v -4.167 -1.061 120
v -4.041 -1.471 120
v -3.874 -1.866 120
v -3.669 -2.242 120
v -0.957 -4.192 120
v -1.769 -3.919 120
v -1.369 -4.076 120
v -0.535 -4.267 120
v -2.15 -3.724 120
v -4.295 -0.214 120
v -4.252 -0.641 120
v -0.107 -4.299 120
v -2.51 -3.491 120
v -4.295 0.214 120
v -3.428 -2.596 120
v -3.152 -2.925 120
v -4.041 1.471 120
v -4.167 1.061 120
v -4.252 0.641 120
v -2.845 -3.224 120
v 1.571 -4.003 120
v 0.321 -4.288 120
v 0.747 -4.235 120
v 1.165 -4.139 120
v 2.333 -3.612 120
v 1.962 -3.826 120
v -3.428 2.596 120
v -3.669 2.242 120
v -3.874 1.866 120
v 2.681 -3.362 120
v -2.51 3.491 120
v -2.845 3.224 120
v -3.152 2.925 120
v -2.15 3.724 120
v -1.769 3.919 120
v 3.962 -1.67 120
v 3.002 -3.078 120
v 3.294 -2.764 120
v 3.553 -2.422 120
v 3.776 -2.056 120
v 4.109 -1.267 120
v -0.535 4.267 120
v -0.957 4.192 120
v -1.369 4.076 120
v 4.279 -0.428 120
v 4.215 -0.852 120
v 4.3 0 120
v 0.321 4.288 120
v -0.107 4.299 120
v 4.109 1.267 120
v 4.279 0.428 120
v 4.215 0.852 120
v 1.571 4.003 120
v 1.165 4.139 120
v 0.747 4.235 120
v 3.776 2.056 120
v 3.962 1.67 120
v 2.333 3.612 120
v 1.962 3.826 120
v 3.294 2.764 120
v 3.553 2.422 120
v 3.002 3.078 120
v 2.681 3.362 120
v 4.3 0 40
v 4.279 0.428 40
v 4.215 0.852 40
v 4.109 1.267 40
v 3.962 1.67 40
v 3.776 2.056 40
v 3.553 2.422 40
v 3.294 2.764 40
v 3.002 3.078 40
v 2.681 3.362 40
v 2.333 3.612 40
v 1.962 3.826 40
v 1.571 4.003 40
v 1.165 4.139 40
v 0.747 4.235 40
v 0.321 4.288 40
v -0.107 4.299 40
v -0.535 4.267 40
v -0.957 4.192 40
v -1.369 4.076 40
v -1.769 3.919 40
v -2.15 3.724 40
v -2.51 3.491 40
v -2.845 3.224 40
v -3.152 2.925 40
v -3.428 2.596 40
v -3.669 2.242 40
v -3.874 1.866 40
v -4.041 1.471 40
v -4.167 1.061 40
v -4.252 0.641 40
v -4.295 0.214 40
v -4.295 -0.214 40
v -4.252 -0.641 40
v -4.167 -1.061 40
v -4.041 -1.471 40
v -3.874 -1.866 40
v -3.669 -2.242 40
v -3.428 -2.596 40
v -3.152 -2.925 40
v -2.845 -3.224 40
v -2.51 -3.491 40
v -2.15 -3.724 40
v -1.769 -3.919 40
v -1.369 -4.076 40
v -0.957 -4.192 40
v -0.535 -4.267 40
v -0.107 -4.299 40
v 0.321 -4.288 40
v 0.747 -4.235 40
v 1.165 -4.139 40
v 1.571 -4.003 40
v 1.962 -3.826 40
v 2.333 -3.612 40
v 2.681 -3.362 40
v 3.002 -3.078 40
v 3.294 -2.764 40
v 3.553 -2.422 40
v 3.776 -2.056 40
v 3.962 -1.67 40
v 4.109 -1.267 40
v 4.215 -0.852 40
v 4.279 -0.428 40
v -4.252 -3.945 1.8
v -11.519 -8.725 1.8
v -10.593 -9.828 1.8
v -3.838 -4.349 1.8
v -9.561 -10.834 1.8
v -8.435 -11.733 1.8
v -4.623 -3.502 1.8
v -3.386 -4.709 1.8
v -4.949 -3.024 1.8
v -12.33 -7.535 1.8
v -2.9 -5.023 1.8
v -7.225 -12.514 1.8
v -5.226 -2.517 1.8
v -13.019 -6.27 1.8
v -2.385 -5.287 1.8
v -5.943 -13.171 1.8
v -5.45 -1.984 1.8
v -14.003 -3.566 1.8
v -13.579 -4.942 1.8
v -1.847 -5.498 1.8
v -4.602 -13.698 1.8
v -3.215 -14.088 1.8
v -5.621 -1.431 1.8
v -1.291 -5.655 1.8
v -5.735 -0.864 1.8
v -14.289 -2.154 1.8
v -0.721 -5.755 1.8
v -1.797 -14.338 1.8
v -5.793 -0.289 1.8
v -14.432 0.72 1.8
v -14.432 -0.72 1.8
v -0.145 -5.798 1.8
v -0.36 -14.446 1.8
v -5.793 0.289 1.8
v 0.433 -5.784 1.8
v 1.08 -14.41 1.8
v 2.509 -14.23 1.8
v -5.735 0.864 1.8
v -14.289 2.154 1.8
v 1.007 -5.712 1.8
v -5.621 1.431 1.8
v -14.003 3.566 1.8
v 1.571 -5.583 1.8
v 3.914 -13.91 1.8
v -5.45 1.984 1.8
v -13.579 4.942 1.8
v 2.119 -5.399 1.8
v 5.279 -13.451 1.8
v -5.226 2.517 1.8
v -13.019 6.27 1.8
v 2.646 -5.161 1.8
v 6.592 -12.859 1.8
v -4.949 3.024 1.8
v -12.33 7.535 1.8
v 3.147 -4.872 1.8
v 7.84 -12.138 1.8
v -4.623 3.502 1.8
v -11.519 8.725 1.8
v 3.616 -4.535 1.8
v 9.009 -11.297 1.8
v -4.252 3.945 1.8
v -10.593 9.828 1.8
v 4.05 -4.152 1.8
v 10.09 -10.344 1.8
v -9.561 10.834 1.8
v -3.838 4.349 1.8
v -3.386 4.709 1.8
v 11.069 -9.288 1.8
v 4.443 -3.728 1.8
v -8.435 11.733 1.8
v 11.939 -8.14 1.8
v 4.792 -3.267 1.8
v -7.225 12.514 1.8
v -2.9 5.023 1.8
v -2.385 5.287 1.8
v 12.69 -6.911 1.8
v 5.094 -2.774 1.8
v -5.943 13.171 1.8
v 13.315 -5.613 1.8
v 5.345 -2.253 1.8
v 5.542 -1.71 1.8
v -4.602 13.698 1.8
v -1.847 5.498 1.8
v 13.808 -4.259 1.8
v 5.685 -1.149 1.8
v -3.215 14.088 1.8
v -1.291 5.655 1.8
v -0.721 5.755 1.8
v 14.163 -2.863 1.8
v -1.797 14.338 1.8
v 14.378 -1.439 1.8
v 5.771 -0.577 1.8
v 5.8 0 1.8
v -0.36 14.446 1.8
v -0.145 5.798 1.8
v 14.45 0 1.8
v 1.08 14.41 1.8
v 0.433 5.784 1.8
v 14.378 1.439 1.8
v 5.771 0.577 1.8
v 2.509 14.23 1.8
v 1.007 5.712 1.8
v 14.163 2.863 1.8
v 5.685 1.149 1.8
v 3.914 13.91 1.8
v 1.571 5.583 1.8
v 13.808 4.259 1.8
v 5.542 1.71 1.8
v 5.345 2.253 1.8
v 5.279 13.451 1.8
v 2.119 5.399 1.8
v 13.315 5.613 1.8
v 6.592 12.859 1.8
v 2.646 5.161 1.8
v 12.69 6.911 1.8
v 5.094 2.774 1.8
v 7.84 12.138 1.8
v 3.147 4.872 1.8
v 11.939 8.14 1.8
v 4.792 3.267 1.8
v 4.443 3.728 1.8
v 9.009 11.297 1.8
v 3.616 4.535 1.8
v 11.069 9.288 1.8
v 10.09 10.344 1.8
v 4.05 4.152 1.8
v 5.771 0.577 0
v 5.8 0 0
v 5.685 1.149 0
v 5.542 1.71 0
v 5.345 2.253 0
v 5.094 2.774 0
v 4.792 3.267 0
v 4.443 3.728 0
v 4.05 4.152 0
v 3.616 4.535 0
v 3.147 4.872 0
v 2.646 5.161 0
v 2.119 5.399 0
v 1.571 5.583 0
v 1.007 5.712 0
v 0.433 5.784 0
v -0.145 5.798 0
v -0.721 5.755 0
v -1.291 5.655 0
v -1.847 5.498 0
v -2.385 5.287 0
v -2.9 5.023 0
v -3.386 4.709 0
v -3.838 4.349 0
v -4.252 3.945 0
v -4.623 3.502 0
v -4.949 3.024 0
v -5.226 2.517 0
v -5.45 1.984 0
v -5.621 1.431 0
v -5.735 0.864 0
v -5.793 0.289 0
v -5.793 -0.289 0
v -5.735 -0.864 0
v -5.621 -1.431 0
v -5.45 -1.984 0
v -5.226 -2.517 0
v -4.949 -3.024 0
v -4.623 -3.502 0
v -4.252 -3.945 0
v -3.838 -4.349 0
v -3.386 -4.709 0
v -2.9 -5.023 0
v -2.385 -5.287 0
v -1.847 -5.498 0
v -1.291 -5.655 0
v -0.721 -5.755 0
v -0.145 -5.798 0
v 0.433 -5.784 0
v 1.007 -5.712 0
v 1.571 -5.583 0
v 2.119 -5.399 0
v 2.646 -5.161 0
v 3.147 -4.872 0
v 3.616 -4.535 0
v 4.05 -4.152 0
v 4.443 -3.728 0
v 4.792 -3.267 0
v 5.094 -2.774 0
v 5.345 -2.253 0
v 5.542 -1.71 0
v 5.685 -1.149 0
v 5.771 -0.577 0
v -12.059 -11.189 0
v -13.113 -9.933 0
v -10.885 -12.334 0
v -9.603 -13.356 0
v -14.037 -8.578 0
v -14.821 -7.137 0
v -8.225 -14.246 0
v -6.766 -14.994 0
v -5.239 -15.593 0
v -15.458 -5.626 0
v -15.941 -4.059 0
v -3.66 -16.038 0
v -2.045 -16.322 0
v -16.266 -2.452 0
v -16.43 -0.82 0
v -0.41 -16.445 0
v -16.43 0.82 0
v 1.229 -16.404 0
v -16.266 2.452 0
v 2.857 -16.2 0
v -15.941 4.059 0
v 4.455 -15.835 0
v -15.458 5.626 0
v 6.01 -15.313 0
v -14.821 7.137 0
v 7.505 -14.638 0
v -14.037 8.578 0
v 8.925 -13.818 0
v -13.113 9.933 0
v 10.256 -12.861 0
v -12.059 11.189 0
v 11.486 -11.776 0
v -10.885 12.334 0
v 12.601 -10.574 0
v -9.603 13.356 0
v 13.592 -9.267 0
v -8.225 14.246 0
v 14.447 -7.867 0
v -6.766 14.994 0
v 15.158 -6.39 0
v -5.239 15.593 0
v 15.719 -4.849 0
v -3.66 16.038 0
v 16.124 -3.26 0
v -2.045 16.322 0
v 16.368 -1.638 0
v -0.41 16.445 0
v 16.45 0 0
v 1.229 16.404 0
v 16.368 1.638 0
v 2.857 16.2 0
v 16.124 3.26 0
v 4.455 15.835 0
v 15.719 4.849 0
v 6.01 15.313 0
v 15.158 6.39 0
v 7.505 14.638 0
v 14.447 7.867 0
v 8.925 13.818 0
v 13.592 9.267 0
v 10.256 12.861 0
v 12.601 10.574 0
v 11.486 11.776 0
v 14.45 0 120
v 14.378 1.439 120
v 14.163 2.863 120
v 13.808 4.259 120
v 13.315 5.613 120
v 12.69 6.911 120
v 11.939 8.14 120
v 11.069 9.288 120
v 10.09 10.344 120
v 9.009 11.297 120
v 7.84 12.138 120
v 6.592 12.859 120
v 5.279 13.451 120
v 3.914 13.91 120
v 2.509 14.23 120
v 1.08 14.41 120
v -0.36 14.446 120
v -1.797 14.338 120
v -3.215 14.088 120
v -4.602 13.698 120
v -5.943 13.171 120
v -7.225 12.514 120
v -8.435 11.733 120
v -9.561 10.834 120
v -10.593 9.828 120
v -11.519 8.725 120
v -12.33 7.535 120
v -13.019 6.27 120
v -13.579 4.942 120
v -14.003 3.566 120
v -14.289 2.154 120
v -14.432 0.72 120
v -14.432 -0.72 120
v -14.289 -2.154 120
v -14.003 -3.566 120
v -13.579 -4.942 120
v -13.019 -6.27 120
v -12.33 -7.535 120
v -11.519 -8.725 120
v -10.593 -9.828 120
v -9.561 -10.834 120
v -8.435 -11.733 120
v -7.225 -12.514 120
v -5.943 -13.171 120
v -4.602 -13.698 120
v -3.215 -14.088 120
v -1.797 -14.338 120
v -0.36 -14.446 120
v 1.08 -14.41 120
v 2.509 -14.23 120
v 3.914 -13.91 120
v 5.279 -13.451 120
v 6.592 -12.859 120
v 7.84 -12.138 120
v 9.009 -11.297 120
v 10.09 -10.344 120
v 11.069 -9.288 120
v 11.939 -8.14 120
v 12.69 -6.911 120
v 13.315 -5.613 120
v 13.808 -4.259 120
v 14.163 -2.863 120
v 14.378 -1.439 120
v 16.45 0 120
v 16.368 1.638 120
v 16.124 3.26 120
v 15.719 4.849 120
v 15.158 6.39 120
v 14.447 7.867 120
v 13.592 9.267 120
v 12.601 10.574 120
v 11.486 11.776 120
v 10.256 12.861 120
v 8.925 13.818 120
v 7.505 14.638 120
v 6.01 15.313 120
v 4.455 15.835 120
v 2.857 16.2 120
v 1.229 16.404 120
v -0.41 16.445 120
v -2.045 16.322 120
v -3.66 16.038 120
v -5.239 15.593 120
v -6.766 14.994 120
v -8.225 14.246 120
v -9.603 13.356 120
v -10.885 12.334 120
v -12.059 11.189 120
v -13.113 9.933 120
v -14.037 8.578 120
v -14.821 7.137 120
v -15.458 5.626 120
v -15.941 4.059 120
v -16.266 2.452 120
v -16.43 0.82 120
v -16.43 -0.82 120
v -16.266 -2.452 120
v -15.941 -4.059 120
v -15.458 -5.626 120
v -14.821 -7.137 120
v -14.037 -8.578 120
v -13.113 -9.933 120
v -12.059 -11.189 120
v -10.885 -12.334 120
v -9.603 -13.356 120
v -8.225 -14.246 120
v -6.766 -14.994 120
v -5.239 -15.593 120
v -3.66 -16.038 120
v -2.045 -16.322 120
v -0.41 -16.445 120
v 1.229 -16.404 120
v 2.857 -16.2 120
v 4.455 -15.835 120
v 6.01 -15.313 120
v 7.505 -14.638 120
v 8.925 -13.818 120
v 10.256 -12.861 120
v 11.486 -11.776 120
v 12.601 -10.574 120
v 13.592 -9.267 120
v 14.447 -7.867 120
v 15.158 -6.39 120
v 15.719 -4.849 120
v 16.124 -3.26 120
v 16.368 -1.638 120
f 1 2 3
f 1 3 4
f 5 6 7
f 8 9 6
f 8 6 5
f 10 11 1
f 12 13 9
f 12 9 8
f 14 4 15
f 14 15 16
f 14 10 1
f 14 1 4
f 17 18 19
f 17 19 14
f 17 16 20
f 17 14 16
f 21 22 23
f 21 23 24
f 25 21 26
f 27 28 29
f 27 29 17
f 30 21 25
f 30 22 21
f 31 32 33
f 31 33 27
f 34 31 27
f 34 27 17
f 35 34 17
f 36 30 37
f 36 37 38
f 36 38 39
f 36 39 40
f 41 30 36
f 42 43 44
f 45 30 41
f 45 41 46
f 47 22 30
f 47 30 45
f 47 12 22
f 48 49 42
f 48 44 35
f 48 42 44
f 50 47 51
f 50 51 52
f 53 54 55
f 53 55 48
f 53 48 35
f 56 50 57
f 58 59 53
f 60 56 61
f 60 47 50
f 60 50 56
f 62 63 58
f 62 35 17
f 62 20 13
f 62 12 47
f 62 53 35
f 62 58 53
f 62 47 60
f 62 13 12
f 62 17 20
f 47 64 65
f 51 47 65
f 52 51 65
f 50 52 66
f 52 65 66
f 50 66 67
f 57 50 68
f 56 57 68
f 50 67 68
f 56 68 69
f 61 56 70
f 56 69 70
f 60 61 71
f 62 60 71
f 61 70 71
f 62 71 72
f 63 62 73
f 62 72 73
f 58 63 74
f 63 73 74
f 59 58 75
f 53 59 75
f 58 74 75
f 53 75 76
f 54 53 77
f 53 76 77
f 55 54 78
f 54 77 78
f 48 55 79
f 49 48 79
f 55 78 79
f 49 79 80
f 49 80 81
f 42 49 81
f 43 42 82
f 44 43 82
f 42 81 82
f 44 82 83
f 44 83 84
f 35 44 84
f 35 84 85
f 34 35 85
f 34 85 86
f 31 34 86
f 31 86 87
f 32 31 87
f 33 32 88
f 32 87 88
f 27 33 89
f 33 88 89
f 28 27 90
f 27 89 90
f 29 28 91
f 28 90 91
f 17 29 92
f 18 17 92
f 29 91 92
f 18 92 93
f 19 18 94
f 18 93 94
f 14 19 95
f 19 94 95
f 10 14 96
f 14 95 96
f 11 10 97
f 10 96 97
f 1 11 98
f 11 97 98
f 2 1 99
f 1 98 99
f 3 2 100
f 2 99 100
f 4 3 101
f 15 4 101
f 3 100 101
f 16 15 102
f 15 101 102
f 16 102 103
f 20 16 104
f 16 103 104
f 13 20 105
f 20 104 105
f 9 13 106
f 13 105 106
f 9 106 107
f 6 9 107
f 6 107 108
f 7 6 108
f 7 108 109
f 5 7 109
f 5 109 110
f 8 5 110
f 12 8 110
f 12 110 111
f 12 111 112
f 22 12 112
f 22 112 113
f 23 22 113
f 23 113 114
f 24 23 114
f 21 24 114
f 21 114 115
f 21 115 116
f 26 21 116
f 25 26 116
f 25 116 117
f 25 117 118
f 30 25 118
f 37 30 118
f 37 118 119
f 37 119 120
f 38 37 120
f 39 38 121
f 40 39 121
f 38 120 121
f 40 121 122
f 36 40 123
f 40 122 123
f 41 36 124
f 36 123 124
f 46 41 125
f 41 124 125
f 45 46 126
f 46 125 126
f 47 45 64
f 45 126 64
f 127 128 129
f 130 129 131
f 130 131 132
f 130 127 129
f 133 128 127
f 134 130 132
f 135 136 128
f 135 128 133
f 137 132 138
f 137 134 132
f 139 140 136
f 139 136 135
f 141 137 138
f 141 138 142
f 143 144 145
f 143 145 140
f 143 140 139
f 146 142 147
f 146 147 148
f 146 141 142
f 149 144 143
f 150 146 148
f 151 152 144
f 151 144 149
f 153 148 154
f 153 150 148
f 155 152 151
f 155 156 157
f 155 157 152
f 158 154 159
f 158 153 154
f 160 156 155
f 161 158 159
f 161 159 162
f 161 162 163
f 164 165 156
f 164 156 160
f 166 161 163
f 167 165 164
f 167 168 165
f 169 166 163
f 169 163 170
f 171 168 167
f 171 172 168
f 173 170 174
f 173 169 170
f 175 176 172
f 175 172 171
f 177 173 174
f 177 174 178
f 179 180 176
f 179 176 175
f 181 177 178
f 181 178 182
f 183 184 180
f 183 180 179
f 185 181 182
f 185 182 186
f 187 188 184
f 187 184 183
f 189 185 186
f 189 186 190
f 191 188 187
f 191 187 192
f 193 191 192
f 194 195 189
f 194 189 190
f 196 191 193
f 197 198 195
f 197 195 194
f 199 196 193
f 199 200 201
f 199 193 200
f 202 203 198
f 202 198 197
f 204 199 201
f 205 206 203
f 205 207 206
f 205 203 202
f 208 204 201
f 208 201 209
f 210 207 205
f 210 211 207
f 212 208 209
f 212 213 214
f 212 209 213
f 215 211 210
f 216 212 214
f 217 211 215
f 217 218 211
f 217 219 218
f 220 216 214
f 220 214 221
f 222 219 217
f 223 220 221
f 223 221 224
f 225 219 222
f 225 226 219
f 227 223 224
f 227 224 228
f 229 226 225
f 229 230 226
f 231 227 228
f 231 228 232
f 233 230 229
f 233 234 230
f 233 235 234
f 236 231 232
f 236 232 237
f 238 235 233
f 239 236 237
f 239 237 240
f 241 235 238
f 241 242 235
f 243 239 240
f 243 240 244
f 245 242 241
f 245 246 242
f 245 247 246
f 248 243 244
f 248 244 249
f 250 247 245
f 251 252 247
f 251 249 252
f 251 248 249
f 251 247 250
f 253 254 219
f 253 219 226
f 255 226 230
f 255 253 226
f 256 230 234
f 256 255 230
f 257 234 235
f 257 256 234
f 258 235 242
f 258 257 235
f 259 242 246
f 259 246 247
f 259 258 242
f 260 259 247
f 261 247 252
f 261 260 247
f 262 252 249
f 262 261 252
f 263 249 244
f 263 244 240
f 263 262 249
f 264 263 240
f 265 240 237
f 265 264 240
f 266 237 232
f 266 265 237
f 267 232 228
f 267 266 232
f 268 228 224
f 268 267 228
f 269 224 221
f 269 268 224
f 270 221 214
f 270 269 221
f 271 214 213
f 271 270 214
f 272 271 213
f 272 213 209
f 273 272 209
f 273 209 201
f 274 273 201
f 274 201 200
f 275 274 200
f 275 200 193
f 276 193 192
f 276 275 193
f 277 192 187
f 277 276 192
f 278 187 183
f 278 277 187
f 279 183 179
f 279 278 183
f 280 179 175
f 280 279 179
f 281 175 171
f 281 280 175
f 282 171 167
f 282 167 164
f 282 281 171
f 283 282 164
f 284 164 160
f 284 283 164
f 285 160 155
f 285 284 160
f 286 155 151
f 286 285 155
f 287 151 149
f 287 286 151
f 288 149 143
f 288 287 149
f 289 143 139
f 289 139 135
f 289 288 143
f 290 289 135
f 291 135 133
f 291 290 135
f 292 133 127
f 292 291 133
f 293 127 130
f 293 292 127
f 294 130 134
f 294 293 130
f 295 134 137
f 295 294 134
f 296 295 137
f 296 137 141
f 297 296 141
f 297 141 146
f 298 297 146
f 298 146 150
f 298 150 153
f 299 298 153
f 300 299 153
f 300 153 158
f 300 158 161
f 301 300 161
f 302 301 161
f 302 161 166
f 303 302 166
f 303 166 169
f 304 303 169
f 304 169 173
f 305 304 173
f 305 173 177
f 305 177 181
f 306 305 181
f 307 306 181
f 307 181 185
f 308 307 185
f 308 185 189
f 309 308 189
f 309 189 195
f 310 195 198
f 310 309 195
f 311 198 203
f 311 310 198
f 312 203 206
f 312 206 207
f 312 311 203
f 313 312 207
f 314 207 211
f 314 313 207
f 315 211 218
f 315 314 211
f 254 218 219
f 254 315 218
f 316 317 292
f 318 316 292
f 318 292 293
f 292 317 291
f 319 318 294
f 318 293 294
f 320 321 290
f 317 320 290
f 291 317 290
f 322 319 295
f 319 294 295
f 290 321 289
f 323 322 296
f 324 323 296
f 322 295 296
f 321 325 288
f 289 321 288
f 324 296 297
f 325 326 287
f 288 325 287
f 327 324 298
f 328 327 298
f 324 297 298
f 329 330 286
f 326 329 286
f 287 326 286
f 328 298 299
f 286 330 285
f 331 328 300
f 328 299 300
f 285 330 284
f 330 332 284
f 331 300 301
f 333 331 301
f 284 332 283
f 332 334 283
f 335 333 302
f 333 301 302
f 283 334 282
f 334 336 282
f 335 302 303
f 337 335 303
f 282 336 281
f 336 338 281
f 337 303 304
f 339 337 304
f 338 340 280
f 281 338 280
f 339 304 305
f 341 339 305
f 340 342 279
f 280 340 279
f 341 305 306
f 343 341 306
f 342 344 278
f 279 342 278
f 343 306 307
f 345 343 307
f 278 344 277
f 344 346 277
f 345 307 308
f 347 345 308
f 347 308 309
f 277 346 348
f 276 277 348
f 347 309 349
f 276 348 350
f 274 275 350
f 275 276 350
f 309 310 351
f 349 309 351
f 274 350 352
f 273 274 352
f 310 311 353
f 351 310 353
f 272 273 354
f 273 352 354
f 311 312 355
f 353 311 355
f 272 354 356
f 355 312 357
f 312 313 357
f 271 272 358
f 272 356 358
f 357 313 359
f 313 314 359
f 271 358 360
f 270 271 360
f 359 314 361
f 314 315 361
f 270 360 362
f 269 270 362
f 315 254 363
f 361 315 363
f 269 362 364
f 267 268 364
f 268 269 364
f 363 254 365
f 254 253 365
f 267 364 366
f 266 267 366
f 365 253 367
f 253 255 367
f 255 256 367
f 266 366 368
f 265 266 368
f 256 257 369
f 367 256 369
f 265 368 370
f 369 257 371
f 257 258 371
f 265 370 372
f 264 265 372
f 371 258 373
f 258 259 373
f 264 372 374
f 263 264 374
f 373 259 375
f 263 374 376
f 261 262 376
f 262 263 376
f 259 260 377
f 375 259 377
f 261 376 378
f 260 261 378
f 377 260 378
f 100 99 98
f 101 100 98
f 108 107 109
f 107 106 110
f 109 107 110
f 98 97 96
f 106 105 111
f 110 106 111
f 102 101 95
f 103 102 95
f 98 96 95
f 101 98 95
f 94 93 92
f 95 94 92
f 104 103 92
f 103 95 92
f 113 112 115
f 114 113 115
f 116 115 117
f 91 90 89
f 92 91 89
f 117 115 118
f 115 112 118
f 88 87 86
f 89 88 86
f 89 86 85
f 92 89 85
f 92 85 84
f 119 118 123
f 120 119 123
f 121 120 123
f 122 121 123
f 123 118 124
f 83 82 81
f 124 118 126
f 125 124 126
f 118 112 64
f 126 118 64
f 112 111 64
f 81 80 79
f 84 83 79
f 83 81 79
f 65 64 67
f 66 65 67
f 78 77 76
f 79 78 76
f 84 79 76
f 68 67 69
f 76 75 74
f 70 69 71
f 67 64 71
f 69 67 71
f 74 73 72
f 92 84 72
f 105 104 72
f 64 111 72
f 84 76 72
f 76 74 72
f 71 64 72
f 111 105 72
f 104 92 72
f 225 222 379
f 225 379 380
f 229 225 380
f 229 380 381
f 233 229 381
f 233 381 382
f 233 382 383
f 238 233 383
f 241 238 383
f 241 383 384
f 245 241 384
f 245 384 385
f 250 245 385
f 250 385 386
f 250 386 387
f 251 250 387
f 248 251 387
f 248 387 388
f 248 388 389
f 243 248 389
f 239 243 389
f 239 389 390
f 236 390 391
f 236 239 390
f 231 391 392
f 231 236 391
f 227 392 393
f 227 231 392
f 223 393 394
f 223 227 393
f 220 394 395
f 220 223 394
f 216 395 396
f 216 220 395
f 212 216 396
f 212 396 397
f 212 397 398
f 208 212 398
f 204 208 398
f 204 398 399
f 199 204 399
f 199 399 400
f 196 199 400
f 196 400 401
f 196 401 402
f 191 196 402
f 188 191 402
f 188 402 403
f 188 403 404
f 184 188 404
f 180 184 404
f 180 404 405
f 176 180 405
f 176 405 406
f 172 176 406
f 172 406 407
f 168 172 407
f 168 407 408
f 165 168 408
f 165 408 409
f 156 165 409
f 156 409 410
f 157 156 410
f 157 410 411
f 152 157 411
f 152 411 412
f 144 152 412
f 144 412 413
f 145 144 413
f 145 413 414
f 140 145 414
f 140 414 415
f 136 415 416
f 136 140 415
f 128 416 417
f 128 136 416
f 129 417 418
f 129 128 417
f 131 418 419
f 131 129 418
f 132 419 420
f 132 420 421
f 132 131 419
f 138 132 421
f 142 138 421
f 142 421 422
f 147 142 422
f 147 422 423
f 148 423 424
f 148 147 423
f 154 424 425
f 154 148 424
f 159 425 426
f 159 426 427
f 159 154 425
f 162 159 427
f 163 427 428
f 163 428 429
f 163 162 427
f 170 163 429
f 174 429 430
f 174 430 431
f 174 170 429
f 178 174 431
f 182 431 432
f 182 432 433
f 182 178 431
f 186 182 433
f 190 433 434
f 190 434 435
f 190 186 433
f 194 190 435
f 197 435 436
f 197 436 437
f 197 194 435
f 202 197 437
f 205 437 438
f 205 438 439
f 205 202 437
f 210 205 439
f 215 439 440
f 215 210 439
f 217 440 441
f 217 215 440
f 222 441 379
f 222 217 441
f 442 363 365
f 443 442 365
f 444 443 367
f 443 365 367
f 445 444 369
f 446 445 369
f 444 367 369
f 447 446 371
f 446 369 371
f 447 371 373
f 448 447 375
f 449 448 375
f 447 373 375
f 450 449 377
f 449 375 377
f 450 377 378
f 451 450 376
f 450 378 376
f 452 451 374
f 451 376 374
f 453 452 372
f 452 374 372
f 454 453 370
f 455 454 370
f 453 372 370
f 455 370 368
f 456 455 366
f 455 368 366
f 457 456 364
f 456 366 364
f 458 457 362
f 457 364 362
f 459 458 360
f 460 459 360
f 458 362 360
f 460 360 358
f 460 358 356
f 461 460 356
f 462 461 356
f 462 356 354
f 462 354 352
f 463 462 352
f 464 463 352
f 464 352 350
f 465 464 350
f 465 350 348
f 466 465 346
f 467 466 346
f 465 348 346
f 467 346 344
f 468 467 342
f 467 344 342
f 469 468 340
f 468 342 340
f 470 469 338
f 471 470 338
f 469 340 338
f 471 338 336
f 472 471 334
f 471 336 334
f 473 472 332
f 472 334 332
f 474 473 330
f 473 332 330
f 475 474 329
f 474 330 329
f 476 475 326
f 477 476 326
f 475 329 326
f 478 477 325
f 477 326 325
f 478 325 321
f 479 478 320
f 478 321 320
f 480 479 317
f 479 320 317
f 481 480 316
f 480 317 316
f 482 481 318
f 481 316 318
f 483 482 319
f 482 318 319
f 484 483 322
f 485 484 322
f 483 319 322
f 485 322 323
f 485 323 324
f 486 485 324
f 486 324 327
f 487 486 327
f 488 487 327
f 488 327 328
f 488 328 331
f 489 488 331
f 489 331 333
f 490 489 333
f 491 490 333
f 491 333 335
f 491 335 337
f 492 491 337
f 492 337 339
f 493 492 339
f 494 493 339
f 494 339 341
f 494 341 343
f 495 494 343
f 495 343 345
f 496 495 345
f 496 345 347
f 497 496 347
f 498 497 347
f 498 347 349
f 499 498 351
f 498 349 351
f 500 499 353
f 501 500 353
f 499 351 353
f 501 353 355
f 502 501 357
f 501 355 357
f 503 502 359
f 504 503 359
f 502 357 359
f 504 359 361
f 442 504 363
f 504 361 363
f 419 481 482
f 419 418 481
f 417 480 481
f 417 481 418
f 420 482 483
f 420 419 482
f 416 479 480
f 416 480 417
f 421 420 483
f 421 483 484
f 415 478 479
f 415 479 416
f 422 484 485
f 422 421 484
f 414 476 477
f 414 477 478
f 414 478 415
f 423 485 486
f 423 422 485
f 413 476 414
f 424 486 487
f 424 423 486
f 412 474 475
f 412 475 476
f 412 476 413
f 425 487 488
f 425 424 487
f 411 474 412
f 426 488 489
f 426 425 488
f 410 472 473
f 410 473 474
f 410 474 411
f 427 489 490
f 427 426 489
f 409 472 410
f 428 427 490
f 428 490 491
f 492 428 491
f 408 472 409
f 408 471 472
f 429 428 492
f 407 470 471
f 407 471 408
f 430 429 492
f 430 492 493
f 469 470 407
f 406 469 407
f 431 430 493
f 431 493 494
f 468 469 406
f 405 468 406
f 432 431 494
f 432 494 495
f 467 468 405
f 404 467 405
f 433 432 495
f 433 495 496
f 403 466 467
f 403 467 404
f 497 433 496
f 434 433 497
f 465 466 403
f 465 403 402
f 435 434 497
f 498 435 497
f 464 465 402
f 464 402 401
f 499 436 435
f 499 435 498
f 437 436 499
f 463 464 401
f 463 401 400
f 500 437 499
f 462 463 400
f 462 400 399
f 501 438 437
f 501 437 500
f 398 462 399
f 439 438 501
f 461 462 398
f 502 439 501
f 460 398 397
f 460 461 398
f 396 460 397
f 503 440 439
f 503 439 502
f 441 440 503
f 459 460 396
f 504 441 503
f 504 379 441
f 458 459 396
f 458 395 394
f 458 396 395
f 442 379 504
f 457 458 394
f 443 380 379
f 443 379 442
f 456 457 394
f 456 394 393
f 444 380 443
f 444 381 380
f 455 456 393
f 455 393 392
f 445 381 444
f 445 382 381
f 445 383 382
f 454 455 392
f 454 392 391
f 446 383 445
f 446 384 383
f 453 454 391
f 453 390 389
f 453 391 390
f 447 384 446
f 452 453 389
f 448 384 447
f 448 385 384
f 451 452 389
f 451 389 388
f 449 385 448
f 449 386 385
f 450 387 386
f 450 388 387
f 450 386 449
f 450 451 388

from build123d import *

# Parameters (mm, degrees)
F0_R     = 16.45
F0_R_2   = 14.45
F1_DEPTH = 120
F0_R_3   = 5.8
F2_DEPTH = 1.8
F3_START = 40
F0_R_4   = 4.3
F3_DEPTH = 80


with BuildPart() as f1:
    # F0 (on Top) → F1 (new body)
    with BuildSketch(Plane.XY):
        Circle(F0_R)
        Circle(F0_R_2, mode=Mode.SUBTRACT)
    extrude(amount=F1_DEPTH)

    # F0 (on Top) → F2 (join)
    with BuildSketch(Plane.XY):
        Circle(F0_R_2)
        Circle(F0_R_3, mode=Mode.SUBTRACT)
    extrude(amount=F2_DEPTH)


with BuildPart() as f3:
    # F0 (on Top) → F3 (new body)
    with BuildSketch(Plane.XY.offset(F3_START)):
        Circle(F0_R_4)
    extrude(amount=F3_DEPTH)


solid = Compound([f1.part, f3.part])
